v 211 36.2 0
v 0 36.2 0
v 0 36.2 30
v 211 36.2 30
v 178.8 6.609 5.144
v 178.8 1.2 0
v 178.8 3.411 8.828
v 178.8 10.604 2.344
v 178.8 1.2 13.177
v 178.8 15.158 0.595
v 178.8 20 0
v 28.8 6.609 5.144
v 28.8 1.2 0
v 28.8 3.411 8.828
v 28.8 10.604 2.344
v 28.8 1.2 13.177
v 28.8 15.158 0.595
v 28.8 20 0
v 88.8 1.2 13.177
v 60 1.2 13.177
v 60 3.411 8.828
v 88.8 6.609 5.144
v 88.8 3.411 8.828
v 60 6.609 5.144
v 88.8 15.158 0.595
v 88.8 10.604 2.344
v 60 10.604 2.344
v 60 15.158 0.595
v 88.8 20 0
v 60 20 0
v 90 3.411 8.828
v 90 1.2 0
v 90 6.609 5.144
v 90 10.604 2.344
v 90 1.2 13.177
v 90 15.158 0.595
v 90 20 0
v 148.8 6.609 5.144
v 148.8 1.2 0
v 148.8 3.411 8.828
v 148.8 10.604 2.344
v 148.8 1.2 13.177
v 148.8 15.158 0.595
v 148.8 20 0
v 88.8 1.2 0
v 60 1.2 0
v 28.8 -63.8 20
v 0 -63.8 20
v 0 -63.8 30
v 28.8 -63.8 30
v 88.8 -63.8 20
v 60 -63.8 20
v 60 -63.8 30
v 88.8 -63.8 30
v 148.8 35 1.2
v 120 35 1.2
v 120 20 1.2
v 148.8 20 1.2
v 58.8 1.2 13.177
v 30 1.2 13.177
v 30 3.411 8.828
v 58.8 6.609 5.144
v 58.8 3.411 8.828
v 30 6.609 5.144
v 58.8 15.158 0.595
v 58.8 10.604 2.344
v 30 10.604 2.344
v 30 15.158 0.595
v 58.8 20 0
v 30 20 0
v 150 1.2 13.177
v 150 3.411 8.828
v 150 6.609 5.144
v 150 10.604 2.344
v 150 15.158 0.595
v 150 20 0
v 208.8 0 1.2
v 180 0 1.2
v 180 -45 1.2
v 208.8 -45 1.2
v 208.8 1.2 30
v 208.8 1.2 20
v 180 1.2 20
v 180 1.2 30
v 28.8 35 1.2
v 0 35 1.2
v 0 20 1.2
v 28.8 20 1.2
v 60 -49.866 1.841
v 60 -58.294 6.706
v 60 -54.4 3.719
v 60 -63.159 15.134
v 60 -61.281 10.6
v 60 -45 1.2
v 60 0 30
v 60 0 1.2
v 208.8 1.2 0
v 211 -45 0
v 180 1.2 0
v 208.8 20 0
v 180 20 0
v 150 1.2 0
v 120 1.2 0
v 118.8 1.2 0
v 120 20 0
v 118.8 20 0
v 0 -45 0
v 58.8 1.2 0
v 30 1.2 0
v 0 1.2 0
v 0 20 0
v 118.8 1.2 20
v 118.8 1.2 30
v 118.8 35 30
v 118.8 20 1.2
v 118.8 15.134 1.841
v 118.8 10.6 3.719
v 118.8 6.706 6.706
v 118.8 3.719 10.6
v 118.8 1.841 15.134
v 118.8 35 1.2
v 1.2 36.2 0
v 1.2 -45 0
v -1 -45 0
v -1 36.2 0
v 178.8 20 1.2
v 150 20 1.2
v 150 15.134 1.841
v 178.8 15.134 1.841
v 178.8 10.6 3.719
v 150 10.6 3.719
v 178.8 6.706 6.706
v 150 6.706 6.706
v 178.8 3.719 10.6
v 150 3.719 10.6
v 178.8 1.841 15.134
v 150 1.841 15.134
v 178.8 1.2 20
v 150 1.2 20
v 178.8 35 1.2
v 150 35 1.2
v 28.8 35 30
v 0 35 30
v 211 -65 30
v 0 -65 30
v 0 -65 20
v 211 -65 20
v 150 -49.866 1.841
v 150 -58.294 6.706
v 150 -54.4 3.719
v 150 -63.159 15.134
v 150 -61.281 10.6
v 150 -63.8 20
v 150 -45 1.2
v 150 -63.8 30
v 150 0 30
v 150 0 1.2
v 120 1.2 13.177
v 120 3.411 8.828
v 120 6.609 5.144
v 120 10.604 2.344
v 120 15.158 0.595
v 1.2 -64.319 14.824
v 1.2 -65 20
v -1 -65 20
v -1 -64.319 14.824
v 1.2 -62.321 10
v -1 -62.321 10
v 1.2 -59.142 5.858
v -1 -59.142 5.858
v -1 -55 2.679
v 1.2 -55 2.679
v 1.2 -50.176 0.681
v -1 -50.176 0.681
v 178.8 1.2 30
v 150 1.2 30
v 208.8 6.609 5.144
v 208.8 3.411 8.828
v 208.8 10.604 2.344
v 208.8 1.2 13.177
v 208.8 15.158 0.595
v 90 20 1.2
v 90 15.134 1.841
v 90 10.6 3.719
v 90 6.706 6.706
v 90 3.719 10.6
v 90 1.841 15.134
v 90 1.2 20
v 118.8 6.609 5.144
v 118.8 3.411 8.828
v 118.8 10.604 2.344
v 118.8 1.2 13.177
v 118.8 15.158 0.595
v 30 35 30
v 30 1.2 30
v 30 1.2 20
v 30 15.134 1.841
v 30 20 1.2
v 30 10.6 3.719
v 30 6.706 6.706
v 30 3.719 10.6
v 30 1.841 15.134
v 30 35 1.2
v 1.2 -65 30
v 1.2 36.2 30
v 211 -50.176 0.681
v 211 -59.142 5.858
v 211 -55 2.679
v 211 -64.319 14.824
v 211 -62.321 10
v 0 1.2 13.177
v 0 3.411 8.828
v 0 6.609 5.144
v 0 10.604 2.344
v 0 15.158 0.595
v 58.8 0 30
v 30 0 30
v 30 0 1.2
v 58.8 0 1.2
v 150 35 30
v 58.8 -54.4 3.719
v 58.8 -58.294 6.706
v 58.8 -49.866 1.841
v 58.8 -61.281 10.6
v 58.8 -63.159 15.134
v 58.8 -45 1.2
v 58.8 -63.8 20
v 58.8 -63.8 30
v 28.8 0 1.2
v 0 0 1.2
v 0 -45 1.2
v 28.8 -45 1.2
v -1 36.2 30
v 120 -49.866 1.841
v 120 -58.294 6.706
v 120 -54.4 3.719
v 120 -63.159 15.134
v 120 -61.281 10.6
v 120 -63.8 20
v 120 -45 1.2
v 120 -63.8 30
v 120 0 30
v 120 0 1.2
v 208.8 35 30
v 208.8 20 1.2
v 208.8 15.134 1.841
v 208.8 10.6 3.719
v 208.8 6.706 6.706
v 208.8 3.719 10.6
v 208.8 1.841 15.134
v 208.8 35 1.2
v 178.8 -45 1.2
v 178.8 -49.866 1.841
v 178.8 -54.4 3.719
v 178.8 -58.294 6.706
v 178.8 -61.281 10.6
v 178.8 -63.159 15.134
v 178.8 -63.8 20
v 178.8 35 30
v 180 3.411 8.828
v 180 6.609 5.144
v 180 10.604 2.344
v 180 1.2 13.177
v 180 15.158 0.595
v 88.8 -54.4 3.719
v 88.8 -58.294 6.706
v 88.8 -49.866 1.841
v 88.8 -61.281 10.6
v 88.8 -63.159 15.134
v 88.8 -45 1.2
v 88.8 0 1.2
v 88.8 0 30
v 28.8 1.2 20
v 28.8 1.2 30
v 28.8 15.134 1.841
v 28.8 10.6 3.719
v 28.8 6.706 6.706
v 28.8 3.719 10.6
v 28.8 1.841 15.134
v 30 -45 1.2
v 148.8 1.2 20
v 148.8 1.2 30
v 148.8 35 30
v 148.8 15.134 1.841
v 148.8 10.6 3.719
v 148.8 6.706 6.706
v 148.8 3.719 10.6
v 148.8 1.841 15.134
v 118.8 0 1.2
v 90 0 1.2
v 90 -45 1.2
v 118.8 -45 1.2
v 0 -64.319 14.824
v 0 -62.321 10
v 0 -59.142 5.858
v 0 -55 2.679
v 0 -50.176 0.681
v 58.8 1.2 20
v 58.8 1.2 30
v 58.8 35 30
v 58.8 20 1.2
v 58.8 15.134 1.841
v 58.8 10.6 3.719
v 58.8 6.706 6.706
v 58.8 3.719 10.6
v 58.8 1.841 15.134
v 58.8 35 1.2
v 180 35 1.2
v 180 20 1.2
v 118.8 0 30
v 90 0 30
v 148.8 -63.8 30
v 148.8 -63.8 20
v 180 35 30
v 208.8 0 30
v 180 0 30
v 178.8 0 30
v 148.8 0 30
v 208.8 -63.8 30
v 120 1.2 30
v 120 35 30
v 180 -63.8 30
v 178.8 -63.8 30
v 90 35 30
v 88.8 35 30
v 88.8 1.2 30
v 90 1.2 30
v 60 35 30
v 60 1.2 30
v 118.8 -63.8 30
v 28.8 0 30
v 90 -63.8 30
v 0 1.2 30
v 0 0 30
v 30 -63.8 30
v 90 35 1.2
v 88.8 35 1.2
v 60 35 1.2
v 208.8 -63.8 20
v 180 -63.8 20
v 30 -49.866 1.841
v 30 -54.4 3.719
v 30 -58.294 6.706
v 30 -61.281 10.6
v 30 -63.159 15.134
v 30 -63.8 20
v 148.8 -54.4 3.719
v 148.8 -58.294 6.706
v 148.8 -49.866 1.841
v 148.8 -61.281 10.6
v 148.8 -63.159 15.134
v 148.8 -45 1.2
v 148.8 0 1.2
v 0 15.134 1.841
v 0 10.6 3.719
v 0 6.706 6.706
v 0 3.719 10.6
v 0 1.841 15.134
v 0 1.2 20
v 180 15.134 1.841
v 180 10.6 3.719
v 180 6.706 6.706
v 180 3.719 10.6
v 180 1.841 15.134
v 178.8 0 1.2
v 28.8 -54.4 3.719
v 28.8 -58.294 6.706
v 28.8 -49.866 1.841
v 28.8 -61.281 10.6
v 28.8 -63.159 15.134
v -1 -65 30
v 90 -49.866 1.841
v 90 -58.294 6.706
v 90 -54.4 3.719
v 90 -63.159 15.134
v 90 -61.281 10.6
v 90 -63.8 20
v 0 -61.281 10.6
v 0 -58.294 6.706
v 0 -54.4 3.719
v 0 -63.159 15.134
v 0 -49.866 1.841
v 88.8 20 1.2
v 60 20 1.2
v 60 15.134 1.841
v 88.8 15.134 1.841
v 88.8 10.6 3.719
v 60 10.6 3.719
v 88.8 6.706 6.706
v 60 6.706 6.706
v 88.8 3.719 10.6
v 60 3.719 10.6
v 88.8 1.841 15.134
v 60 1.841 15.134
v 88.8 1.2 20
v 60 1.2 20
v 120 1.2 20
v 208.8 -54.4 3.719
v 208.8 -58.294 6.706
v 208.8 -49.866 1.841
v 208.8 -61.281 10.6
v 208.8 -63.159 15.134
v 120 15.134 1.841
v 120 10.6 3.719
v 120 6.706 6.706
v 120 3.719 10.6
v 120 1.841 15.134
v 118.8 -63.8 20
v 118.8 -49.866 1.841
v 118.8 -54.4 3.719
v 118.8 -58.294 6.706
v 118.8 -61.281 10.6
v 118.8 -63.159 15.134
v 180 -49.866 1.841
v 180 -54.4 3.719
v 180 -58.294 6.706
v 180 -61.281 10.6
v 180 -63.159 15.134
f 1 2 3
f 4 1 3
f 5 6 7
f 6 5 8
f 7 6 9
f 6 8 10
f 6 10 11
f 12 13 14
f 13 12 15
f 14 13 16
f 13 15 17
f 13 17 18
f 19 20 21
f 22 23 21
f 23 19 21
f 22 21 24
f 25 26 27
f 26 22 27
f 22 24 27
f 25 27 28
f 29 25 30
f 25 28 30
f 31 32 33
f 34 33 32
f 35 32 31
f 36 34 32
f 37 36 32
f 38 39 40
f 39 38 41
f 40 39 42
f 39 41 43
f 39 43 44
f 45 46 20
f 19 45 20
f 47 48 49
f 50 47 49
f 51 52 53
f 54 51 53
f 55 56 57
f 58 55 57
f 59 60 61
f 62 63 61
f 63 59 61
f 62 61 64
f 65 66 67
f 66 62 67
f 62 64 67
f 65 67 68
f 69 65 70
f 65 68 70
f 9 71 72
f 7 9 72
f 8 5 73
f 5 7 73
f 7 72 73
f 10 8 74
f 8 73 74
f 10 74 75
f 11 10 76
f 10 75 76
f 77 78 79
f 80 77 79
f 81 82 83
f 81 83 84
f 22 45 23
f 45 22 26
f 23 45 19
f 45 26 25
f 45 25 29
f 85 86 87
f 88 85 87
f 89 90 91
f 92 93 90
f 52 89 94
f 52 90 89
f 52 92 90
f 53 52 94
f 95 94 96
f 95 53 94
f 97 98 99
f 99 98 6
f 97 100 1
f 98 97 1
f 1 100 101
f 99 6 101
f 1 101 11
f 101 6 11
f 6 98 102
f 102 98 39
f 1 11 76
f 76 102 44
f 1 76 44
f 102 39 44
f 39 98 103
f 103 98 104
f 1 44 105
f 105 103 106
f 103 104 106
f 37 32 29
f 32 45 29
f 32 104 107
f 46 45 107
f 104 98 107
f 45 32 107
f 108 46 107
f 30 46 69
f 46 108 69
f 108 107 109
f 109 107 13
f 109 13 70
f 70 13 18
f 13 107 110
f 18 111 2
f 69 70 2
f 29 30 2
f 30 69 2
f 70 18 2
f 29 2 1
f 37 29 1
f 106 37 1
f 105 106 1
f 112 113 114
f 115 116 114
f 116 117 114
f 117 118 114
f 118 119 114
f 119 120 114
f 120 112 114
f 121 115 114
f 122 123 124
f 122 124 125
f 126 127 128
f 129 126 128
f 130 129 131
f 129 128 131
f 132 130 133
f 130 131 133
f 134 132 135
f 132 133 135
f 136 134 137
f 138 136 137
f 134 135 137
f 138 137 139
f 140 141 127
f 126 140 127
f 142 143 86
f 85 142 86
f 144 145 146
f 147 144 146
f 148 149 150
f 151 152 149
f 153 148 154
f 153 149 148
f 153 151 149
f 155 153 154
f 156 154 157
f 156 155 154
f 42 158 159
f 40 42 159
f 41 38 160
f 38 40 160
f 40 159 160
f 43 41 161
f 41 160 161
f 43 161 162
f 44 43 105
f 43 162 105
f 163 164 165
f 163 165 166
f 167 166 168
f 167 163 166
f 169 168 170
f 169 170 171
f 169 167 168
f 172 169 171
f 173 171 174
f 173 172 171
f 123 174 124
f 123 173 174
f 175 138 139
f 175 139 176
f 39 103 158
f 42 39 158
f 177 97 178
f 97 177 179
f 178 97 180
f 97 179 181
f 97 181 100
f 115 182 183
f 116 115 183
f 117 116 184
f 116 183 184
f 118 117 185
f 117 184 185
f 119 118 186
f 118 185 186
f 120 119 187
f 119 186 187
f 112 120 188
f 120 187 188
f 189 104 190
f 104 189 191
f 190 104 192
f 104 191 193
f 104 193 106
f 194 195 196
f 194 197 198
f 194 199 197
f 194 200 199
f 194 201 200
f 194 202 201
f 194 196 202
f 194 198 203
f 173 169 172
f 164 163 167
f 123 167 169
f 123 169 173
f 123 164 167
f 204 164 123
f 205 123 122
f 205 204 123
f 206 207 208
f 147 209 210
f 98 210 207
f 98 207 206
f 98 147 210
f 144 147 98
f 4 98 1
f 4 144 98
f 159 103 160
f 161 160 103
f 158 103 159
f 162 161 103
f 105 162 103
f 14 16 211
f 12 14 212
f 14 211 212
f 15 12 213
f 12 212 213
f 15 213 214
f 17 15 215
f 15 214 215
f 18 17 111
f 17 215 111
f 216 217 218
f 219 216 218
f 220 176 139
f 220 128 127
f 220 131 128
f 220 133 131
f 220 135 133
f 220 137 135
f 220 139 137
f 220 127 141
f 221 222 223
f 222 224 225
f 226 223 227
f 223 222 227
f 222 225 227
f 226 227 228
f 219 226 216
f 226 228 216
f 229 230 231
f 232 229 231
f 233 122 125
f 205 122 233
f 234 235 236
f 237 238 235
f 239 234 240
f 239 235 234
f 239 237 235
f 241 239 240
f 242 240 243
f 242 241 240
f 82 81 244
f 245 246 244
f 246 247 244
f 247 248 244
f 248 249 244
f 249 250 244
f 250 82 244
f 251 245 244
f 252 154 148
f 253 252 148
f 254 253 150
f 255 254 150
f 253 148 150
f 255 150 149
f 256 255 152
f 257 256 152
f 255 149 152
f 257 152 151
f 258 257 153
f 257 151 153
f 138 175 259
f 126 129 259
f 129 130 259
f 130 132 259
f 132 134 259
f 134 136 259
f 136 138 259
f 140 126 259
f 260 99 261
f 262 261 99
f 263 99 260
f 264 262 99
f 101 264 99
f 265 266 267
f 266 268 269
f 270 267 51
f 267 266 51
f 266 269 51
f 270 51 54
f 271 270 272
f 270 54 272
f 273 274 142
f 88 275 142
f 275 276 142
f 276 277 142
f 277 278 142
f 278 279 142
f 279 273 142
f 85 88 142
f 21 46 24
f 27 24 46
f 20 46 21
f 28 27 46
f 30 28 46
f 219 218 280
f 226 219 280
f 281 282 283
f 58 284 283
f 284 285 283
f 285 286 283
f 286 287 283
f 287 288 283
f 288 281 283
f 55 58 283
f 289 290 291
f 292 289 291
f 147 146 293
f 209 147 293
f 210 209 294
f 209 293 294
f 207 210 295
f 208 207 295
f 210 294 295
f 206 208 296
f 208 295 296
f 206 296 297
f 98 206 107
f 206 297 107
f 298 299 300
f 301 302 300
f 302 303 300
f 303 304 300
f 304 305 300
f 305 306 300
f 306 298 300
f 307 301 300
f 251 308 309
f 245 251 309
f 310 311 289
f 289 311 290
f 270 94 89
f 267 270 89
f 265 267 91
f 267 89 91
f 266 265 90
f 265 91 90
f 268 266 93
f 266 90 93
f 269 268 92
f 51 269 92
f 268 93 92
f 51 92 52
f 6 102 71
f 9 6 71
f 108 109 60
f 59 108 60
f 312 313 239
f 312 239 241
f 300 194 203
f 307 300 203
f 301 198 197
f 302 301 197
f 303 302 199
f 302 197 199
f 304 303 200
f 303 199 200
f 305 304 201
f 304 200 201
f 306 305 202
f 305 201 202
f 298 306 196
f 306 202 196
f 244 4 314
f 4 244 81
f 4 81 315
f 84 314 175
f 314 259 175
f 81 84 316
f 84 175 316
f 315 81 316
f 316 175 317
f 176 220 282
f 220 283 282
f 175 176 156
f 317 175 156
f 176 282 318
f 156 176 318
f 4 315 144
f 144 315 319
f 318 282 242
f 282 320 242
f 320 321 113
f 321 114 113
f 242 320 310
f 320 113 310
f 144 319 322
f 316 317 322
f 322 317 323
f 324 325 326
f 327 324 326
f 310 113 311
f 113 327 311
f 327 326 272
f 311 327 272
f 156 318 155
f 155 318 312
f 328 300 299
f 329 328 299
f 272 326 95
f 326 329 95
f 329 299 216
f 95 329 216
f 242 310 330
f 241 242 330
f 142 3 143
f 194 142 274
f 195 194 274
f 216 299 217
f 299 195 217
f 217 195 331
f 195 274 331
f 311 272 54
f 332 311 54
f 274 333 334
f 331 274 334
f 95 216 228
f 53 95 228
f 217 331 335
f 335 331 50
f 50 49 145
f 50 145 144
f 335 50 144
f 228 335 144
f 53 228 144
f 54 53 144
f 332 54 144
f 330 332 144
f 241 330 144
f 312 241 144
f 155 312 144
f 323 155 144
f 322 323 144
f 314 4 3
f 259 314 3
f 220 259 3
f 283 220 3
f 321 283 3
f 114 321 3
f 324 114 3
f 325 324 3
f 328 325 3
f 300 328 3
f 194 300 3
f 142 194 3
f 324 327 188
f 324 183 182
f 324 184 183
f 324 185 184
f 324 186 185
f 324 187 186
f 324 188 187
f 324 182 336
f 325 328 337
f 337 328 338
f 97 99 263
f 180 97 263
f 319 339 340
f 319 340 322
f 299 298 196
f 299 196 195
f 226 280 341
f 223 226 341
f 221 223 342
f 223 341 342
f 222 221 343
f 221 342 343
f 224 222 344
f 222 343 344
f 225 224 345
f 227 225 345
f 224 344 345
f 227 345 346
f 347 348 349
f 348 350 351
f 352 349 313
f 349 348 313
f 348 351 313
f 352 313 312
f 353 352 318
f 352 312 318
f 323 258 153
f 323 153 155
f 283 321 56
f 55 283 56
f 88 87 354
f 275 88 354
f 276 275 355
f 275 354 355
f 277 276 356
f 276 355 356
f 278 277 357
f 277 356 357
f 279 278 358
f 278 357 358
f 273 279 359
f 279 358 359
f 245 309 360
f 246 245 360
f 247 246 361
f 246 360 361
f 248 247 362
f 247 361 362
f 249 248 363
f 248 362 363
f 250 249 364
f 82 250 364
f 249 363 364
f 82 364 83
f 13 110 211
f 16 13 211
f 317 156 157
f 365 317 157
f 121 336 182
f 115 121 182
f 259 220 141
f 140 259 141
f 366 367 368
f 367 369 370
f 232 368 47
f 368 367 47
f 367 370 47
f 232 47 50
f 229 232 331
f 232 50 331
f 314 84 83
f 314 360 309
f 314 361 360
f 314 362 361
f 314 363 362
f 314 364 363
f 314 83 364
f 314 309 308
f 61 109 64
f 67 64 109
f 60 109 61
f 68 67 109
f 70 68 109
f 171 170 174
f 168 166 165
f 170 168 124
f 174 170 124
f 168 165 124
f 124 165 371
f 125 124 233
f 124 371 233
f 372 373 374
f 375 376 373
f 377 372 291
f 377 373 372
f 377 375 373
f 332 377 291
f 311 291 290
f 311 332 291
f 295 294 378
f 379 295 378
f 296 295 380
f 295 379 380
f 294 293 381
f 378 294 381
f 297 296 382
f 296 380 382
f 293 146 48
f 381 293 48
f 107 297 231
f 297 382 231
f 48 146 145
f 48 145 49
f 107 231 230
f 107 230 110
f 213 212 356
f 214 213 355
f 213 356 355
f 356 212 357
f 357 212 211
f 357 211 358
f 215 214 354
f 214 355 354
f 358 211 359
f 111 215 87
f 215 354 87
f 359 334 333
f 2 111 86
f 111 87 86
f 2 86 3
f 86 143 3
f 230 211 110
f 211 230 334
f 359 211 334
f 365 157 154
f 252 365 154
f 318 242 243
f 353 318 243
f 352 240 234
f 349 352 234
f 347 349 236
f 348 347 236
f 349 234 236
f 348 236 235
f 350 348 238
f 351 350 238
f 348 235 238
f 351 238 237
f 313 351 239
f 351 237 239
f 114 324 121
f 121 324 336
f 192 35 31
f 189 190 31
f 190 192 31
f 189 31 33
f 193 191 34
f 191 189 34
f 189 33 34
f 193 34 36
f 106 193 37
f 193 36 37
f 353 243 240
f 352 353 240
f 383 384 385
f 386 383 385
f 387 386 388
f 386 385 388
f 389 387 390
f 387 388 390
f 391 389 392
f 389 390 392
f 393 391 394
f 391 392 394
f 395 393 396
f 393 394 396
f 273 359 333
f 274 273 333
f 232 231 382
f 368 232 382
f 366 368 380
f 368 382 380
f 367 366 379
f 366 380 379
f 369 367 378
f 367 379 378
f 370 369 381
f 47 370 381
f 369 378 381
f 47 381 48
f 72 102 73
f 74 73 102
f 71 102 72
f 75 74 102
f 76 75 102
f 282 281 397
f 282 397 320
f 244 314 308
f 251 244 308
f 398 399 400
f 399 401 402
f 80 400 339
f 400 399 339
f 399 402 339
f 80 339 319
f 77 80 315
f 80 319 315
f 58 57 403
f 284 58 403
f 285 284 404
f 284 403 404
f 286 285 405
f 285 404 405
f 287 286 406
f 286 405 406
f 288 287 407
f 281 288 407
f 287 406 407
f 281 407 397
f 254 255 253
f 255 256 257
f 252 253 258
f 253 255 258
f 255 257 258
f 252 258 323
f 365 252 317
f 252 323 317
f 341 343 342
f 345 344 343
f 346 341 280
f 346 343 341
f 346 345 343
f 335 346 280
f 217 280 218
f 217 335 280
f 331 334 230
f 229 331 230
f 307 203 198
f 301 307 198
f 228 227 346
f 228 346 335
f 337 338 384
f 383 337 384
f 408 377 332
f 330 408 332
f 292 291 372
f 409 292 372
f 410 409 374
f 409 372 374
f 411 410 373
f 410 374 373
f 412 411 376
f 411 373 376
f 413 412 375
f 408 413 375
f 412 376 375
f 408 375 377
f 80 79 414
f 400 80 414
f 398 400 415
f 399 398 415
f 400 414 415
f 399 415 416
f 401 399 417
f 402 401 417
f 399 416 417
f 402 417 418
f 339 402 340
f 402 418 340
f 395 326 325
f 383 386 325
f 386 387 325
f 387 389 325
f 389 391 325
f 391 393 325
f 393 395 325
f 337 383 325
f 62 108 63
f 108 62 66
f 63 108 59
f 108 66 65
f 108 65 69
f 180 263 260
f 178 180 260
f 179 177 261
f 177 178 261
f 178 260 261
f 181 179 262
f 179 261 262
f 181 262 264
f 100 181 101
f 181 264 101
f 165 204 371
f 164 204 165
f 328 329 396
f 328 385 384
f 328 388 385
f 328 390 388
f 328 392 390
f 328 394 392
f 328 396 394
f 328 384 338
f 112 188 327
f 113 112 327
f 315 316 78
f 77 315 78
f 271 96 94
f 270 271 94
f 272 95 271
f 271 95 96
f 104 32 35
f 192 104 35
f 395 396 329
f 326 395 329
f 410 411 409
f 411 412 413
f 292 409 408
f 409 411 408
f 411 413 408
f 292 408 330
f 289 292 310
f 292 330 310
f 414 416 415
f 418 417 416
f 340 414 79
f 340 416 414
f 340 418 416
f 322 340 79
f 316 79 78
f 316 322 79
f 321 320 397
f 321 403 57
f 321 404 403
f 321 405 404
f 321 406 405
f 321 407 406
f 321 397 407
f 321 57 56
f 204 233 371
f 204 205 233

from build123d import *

# Parameters (mm, degrees)
F1_DEPTH      = 210
F3_DEPTH      = 1.2
F3_DEPTH_BACK = 1
F4_START      = 28.8
F4_DEPTH      = 1.2
F5_START      = 58.8
F5_DEPTH      = 1.2
F6_START      = 88.8
F6_DEPTH      = 1.2
F7_START      = 118.8
F7_DEPTH      = 1.2
F8_START      = 148.8
F8_DEPTH      = 1.2
F9_START      = 178.8
F9_DEPTH      = 1.2
F10_START     = 208.8
F10_DEPTH     = 2.2


with BuildPart() as f1:
    # F0 (on Right) → F1 (new body)
    with BuildSketch(Plane.YZ):
        with BuildLine():
            Line((-45, 0), (0, 0))
            Line((0, 0), (0, 1.2))
            Line((0, 1.2), (-45, 1.2))
            ThreePointArc((-45, 1.2), (-58.2936074863, 6.7063925137), (-63.8, 20))
            Line((-63.8, 20), (-63.8, 30))
            Line((-63.8, 30), (-65, 30))
            Line((-65, 30), (-65, 20))
            ThreePointArc((-65, 20), (-59.1421356237, 5.8578643763), (-45, 0))
        make_face()
        with BuildLine():
            Line((0, 1.2), (0, 0))
            Line((0, 0), (1.2, 0))
            Line((1.2, 0), (1.2, 13.1765111563))
            ThreePointArc((1.2, 13.1765111563), (0.3022843964, 16.5358983849), (0, 20))
            Line((0, 20), (0, 1.2))
        make_face()
        with BuildLine():
            Line((0, 30), (0, 20))
            ThreePointArc((0, 20), (0.3022843964, 16.5358983849), (1.2, 13.1765111563))
            ThreePointArc((1.2, 13.1765111563), (8.5211014656, 3.62212198), (20, 0))
            Line((20, 0), (35, 0))
            Line((35, 0), (35, 1.2))
            Line((35, 1.2), (20, 1.2))
            ThreePointArc((20, 1.2), (6.7063925137, 6.7063925137), (1.2, 20))
            Line((1.2, 20), (1.2, 30))
            Line((1.2, 30), (0, 30))
        make_face()
        Polygon((35, 1.2), (35, 0), (36.2, 0), (36.2, 30), (35, 30), align=None)
    extrude(amount=F1_DEPTH)

    # F2 (on Right) → F4 (join)
    with BuildSketch(Plane.YZ.offset(F4_START)):
        with BuildLine():
            Line((-65, 30), (-65, 20))
            ThreePointArc((-65, 20), (-59.1421356237, 5.8578643763), (-45, 0))
            Line((-45, 0), (36.2, 0))
            Line((36.2, 0), (36.2, 30))
            Line((36.2, 30), (-65, 30))
        make_face()
    extrude(amount=F4_DEPTH)

    # F2 (on Right) → F5 (join)
    with BuildSketch(Plane.YZ.offset(F5_START)):
        with BuildLine():
            Line((-65, 30), (-65, 20))
            ThreePointArc((-65, 20), (-59.1421356237, 5.8578643763), (-45, 0))
            Line((-45, 0), (36.2, 0))
            Line((36.2, 0), (36.2, 30))
            Line((36.2, 30), (-65, 30))
        make_face()
    extrude(amount=F5_DEPTH)

    # F2 (on Right) → F6 (join)
    with BuildSketch(Plane.YZ.offset(F6_START)):
        with BuildLine():
            Line((-65, 30), (-65, 20))
            ThreePointArc((-65, 20), (-59.1421356237, 5.8578643763), (-45, 0))
            Line((-45, 0), (36.2, 0))
            Line((36.2, 0), (36.2, 30))
            Line((36.2, 30), (-65, 30))
        make_face()
    extrude(amount=F6_DEPTH)

    # F2 (on Right) → F7 (join)
    with BuildSketch(Plane.YZ.offset(F7_START)):
        with BuildLine():
            Line((-65, 30), (-65, 20))
            ThreePointArc((-65, 20), (-59.1421356237, 5.8578643763), (-45, 0))
            Line((-45, 0), (36.2, 0))
            Line((36.2, 0), (36.2, 30))
            Line((36.2, 30), (-65, 30))
        make_face()
    extrude(amount=F7_DEPTH)

    # F2 (on Right) → F8 (join)
    with BuildSketch(Plane.YZ.offset(F8_START)):
        with BuildLine():
            Line((-65, 30), (-65, 20))
            ThreePointArc((-65, 20), (-59.1421356237, 5.8578643763), (-45, 0))
            Line((-45, 0), (36.2, 0))
            Line((36.2, 0), (36.2, 30))
            Line((36.2, 30), (-65, 30))
        make_face()
    extrude(amount=F8_DEPTH)

    # F2 (on Right) → F9 (join)
    with BuildSketch(Plane.YZ.offset(F9_START)):
        with BuildLine():
            Line((-65, 30), (-65, 20))
            ThreePointArc((-65, 20), (-59.1421356237, 5.8578643763), (-45, 0))
            Line((-45, 0), (36.2, 0))
            Line((36.2, 0), (36.2, 30))
            Line((36.2, 30), (-65, 30))
        make_face()
    extrude(amount=F9_DEPTH)

    # F2 (on Right) → F10 (join)
    with BuildSketch(Plane.YZ.offset(F10_START)):
        with BuildLine():
            Line((-65, 30), (-65, 20))
            ThreePointArc((-65, 20), (-59.1421356237, 5.8578643763), (-45, 0))
            Line((-45, 0), (36.2, 0))
            Line((36.2, 0), (36.2, 30))
            Line((36.2, 30), (-65, 30))
        make_face()
    extrude(amount=F10_DEPTH)


with BuildPart() as f3:
    # F2 (on Right) → F3 (new body, two sides)
    with BuildSketch(Plane.YZ) as f3_sk:
        with BuildLine():
            Line((-65, 30), (-65, 20))
            ThreePointArc((-65, 20), (-59.1421356237, 5.8578643763), (-45, 0))
            Line((-45, 0), (36.2, 0))
            Line((36.2, 0), (36.2, 30))
            Line((36.2, 30), (-65, 30))
        make_face()
    extrude(amount=F3_DEPTH)
    extrude(f3_sk.sketch, amount=-F3_DEPTH_BACK)


solid = Compound([f1.part, f3.part])
